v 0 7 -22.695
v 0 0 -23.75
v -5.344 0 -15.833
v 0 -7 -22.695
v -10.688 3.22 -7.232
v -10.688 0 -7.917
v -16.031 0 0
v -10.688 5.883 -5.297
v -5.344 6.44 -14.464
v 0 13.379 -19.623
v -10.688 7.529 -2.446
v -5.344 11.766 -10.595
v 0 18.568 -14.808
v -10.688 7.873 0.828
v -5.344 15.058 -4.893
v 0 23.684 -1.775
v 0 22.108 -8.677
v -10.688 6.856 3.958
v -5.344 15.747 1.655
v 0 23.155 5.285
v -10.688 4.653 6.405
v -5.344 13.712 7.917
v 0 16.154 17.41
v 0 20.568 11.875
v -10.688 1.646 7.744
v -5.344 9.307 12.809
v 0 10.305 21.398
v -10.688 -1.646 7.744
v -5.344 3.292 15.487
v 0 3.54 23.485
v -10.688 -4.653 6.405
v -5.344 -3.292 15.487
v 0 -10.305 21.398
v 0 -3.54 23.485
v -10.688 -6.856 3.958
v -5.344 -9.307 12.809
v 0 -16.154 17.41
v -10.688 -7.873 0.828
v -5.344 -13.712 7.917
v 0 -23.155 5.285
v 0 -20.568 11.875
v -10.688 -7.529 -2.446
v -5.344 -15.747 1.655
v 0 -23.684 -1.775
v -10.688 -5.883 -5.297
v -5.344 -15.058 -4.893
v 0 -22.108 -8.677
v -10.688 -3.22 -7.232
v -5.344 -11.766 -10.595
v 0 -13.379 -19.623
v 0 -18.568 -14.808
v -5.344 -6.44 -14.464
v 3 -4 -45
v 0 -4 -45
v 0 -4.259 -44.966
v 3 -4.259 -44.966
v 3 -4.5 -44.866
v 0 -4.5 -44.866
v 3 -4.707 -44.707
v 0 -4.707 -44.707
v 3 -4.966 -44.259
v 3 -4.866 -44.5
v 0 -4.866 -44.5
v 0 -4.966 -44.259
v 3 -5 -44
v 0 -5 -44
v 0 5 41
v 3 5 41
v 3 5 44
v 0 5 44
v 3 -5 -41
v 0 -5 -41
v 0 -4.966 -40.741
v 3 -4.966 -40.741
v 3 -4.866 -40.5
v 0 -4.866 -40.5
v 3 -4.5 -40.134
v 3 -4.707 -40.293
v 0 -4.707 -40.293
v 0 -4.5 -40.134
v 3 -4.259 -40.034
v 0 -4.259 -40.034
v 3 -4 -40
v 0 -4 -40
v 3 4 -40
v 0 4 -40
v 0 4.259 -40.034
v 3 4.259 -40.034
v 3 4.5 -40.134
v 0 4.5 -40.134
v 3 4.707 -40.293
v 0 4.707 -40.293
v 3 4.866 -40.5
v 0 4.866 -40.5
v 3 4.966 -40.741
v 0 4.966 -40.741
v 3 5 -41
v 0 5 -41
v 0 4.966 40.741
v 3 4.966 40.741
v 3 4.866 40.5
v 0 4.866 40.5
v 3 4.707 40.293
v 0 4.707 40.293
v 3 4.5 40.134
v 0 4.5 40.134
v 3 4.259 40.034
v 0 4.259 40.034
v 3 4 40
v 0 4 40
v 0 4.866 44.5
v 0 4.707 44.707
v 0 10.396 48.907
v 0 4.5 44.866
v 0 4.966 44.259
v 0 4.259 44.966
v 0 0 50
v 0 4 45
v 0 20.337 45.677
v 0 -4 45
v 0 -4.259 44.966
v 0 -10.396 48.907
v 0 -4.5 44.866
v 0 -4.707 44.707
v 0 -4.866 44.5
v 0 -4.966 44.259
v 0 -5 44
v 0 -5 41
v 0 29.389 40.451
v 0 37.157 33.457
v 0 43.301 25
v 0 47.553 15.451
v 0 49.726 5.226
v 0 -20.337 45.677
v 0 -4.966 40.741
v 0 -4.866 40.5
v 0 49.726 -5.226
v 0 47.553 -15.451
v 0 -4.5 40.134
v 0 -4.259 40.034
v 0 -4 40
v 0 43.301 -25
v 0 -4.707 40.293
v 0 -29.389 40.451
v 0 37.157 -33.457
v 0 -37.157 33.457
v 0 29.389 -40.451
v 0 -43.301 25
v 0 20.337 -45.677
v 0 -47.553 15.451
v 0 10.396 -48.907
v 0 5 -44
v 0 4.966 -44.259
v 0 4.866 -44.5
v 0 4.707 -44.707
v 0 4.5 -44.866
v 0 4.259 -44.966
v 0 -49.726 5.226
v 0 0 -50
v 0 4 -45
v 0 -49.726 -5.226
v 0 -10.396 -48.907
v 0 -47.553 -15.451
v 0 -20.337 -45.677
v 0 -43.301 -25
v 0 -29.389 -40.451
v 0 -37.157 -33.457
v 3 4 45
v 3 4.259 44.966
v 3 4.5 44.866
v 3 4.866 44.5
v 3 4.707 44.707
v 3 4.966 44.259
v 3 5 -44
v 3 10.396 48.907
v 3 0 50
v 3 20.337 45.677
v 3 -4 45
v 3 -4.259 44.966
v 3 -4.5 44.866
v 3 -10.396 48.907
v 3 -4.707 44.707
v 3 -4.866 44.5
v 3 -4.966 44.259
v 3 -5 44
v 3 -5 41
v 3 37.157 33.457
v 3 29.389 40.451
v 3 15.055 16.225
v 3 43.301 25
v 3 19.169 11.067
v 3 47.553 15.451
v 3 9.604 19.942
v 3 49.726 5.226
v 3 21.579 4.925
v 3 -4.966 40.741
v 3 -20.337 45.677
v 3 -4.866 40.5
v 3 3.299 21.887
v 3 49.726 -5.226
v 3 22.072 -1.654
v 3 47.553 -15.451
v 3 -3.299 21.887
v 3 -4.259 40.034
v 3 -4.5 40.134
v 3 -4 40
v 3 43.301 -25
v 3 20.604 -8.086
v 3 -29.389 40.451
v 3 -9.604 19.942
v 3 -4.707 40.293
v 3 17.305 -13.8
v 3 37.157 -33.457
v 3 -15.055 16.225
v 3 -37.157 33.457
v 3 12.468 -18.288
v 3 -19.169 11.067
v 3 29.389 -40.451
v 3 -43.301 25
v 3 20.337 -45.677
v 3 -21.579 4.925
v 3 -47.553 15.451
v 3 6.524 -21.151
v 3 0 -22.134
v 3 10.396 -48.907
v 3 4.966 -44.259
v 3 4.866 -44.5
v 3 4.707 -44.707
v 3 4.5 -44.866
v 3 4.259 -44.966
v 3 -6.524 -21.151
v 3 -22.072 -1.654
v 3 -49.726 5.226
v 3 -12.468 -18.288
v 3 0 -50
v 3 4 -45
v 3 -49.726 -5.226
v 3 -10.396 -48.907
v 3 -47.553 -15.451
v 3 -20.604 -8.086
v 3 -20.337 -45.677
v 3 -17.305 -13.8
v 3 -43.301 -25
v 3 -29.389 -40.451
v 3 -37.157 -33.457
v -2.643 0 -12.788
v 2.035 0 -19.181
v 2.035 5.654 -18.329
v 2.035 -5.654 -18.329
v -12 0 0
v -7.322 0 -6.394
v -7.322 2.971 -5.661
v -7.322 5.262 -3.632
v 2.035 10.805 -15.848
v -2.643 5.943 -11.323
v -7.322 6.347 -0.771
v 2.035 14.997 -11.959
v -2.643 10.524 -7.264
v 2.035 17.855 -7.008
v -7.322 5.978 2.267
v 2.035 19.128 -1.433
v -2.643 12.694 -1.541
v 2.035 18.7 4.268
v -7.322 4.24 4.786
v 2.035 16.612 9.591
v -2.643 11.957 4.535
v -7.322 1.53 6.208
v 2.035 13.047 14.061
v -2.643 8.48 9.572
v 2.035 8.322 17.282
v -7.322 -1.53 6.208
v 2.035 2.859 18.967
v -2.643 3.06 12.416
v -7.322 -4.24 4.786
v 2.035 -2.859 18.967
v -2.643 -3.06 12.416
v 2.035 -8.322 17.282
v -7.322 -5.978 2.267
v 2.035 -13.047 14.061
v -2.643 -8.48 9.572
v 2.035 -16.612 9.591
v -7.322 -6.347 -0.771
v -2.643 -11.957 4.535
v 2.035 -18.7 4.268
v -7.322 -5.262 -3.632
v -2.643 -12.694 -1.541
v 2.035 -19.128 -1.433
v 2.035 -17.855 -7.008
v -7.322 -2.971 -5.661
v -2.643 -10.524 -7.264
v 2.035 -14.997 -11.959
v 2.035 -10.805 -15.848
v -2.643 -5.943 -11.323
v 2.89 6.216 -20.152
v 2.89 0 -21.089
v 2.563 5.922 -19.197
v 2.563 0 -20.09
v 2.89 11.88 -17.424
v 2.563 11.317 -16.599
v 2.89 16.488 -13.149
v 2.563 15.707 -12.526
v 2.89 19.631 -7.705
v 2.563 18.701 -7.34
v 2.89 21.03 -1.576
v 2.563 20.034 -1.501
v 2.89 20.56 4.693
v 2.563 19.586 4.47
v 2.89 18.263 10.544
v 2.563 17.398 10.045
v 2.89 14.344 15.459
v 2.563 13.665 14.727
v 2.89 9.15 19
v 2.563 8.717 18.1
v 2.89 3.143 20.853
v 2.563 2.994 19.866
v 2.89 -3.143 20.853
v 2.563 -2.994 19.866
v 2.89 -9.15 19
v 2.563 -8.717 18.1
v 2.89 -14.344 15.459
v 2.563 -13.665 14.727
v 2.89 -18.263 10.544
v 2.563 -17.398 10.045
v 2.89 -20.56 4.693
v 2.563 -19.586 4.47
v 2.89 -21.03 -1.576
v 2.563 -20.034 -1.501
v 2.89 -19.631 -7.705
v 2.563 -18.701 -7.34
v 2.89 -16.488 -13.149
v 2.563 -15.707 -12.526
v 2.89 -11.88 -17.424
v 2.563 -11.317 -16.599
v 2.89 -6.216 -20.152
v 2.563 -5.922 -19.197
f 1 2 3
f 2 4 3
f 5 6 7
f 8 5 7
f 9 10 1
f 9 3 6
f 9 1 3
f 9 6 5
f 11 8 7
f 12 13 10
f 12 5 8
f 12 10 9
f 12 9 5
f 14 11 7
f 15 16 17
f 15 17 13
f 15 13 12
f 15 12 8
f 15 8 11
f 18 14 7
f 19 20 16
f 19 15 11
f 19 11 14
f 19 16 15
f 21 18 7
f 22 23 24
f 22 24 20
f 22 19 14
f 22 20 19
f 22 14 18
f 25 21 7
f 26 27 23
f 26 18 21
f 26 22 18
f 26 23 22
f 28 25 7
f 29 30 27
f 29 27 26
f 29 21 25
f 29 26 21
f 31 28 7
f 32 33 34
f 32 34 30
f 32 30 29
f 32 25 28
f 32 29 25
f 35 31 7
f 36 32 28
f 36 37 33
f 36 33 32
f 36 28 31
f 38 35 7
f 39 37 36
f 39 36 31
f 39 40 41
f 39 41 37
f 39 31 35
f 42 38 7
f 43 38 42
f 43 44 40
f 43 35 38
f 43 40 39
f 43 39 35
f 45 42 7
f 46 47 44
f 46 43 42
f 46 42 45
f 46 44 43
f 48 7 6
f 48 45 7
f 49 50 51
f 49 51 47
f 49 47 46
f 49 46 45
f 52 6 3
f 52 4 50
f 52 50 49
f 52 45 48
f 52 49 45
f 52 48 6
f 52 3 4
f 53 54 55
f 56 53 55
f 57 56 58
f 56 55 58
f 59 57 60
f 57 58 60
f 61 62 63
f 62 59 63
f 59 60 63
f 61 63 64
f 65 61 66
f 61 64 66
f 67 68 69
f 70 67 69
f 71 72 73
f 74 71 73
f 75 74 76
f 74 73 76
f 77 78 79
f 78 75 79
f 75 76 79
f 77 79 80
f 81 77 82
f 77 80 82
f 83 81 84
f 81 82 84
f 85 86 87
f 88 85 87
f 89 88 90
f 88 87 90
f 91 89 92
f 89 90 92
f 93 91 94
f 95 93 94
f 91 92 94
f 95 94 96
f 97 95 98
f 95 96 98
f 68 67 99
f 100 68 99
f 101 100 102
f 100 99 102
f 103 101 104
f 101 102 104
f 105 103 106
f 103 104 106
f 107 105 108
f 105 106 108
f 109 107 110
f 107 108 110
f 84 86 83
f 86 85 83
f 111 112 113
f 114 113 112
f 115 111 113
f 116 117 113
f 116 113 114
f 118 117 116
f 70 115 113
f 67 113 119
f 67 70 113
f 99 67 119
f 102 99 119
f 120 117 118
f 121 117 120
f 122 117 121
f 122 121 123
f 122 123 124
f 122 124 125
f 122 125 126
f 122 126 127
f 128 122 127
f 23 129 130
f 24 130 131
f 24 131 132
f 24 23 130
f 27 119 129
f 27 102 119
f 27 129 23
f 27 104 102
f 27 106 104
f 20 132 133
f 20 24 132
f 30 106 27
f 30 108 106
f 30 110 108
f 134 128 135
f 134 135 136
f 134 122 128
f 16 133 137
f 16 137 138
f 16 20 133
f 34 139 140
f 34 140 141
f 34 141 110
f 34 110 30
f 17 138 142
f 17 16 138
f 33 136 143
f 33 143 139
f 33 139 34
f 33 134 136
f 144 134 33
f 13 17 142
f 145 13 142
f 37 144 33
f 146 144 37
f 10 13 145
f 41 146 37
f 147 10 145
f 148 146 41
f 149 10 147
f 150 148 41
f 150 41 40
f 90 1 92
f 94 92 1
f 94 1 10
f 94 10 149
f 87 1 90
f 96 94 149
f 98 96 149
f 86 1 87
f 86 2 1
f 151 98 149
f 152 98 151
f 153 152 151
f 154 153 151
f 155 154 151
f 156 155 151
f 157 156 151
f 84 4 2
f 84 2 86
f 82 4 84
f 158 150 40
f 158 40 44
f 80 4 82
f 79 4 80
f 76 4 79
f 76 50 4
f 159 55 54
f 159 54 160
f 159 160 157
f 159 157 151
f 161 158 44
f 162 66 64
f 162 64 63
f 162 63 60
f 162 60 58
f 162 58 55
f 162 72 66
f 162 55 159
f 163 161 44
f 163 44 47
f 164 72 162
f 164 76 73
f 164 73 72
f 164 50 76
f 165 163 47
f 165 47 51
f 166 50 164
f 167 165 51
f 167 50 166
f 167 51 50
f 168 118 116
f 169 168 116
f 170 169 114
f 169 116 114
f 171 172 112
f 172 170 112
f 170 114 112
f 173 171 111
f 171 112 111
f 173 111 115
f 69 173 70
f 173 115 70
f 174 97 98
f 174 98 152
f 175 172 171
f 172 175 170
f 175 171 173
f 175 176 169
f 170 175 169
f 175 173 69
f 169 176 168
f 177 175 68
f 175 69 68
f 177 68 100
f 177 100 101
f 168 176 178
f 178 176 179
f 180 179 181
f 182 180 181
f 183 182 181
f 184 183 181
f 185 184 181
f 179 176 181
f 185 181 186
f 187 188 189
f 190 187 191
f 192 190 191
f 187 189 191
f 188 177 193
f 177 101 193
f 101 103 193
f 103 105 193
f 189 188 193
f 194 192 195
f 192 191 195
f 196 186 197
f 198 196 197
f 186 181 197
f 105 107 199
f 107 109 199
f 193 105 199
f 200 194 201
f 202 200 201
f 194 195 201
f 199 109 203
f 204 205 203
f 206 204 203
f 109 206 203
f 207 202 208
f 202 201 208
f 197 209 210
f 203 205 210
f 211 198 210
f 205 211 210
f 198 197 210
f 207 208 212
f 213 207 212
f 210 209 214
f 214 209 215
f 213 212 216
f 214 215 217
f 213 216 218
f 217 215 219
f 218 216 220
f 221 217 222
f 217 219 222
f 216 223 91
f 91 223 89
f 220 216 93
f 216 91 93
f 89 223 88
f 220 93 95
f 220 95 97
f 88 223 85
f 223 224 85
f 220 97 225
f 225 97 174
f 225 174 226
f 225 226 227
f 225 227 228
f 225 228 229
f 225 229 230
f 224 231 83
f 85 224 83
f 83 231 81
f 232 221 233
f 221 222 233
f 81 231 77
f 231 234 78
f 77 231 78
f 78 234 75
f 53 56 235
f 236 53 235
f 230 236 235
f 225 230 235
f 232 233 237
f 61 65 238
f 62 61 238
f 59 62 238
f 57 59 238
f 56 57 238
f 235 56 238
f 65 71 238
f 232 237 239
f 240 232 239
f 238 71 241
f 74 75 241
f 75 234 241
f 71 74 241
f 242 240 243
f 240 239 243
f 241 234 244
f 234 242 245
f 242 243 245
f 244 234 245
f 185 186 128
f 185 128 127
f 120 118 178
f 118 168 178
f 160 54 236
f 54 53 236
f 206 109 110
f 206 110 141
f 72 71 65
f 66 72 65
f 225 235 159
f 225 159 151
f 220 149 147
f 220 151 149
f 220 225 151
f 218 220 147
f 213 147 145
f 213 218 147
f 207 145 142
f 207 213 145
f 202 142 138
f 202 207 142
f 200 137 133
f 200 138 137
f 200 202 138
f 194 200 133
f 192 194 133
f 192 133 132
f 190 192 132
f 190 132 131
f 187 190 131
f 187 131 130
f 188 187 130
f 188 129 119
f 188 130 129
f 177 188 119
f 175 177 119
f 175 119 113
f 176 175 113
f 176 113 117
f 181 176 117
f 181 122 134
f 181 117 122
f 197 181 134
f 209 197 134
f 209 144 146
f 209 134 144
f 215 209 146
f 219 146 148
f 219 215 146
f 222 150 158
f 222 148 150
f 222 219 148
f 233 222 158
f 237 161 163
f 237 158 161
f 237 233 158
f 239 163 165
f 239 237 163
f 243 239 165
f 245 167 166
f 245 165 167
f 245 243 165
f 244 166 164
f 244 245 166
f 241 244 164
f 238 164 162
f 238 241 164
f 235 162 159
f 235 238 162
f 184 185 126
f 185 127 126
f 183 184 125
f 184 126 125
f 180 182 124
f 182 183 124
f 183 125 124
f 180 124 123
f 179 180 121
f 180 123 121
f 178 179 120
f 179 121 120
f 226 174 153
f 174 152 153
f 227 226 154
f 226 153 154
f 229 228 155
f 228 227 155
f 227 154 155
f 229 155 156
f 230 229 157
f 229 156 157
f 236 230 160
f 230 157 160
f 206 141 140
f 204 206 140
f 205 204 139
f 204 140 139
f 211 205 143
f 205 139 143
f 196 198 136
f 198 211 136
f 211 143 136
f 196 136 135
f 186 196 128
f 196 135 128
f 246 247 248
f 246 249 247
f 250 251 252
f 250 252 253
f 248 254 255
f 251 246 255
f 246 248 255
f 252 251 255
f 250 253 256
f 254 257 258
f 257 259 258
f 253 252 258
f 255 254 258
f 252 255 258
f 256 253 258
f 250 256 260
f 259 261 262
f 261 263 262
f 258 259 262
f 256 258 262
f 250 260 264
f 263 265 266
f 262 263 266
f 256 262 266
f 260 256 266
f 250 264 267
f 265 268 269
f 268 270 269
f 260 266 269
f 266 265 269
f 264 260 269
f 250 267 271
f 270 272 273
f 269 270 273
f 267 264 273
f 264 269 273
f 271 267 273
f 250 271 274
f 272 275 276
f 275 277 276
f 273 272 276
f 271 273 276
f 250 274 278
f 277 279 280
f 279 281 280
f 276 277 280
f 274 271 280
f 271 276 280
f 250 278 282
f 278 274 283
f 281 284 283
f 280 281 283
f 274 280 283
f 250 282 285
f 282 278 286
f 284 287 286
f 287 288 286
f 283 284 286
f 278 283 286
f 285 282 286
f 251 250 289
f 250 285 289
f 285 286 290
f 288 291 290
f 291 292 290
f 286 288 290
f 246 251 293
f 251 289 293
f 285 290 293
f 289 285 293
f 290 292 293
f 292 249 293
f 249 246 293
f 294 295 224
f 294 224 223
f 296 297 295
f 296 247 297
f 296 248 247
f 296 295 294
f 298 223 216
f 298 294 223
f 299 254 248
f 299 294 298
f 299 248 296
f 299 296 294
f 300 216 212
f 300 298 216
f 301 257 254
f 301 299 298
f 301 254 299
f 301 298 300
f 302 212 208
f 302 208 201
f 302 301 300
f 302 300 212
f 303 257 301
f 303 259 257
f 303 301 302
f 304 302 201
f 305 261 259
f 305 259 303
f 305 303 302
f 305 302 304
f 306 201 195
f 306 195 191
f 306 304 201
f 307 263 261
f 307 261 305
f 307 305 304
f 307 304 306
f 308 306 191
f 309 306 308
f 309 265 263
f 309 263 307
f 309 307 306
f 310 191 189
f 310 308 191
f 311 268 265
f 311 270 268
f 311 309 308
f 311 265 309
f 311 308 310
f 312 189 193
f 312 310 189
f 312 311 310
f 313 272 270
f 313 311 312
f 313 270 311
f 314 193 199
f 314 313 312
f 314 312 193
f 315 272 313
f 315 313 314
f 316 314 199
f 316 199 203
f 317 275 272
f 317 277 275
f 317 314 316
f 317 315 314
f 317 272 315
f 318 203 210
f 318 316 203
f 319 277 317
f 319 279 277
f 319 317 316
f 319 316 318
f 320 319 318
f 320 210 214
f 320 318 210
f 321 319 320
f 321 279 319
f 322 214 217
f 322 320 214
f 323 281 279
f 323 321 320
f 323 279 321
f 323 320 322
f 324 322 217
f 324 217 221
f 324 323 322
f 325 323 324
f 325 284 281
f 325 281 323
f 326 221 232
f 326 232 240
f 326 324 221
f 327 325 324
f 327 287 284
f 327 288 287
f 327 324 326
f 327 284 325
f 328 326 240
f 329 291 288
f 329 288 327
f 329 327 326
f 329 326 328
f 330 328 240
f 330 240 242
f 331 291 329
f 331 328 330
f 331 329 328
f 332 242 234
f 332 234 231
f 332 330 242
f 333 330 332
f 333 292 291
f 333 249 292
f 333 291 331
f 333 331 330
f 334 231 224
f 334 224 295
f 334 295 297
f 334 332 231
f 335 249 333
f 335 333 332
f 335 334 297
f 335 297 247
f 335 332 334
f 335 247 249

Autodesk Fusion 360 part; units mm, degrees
sketch "Sketch1" plane through (0, 0, 0) normal (0, 1, 0) x (1, 0, 0)
  line L0 (0, 0) -> (0, 23.75)
  line L1 (0, 0) -> (0, 50)
  line L2 (0, 50) -> (3, 50)
  line L3 (3, 50) -> (3, 0)
  line L4 (0, 0) -> (-16.0313, 0)
  line L5 (0, 23.75) -> (-16.0313, 0)
  line L6 (3, 0) -> (0, 0)
  dimension "d1" = 23.75
  dimension "d2" = 3
  dimension "d3" = 16.0313
revolve "Revolve1" add sketch "Sketch1" angle 360 about axis through (0, 0, 0) along (-1, 0, 0) contours L0 L1 L4 L5
revolve "Revolve2" add sketch "Sketch1" angle 360 about axis through (3, 0, 0) along (-1, 0, 0) contours L0 L1 L2 L3 L6
sketch "Sketch2" plane through (0, 0, 0) normal (0, 1, 0) x (1, 0, 0)
  line L0 (0, 0) -> (3, 0)
  line L1 (3, 0) -> (-12, 0)
  line L2 (3, 0) -> (3, 20.5)
  line L3 (3, 20.5) -> (-12, 0)
  line L4 (3, 20.5) -> (3, 0)
  dimension "d6" = 3
  dimension "d7" = 15
  dimension "d8" = 20.5
revolve "Revolve3" cut sketch "Sketch2" angle 360 about axis through (1.75, 0, 0) along (1, 0, 0)
sketch "Sketch3" plane through (3, 0, 0) normal (1, 0, 0) x (0, 0, -1)
  circle A0 centre (0, 0) radius 50
  line L0 (0, 0) -> (0, 5)
  line L1 (0, 5) -> (0, -5)
  line L2 (0, 5) -> (-45, 5)
  line L3 (0, -5) -> (-45, -5)
  line L4 (-45, 5) -> (-45, -5)
  line L5 (-45, 5) -> (-40, 5)
  line L6 (-40, 5) -> (-40, -5)
  line L7 (-40, -5) -> (-45, -5)
  line L8 (-45, -5) -> (-45, 5)
  line L9 (40, 5) -> (40, -5)
  line L10 (0, 5) -> (45, 5)
  line L11 (45, -5) -> (45, 5)
  line L12 (40, -5) -> (45, -5)
  line L13 (0, -5) -> (45, -5)
  circle A1 centre (0, 0) radius 20.5
  dimension "d16" = 5
  dimension "d17" = 10
  dimension "d18" = 45
  dimension "d19" = 5
extrude "Extrude2" cut sketch "Sketch3" against normal blind 3 contours L2 L3 L4 L5 L6 L7 L8 | L9 L10 L11 L12 L13
fillet "Fillet2" radius 1 8 edges at (1.5, 5, 45) (1.5, 5, 40) (1.5, -5, 40) (1.5, -5, 45) (1.5, 5, -45) (1.5, 5, -40) (1.5, -5, -40) (1.5, -5, -45)
fillet "Fillet3" radius 5 1 edges at (3, 7.4131, 19.1127)
equation "d1 = ( 47.5 / 2 ) * 1 mm"
equation "d3 = ( 1.60313 * 10 ) * 1 mm"
equation "d7 = 18.000 mm - 3 mm"
equation "d8 = 23.5 mm - 3 mm"
